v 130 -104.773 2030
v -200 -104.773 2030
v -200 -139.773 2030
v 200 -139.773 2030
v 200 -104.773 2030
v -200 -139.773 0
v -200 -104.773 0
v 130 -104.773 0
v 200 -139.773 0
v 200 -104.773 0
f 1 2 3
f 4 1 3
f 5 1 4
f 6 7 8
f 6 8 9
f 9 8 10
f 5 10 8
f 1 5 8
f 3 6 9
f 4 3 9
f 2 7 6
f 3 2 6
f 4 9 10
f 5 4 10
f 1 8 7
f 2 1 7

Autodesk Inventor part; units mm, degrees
ref_plane "YZ Plane" through (0, 0, 0) normal (1, 0, 0) x (0, 1, 0)
ref_plane "XZ Plane" through (0, 0, 0) normal (0, 1, 0) x (-1, 0, 0)
ref_plane "XY Plane" through (0, 0, 0) normal (0, 0, 1) x (1, 0, 0)
ref_plane "Work Plane1" through (0, 0, 0) normal (0, 0, 1) x (1, 0, 0)
sketch "Sketch1" plane through (0, 0, 0) normal (0, 0, 1) x (1, 0, 0)
  line L0 (-270, -89.7729) -> (-720, -193.6636) projected
  line L1 (-720, -193.6636) -> (-708.7524, -242.3821) projected
  line L2 (-708.7524, -242.3821) -> (-264.3032, -139.7729) projected
  line L3 (-200, -139.7729) -> (-264.3032, -139.7729) projected
  line L4 (-200, -91.2956) -> (-200, -139.7729) projected
  line L5 (130, 139.7729) -> (-200, -91.2956) projected
  line L6 (130, -104.7729) -> (130, 139.7729) projected
  line L7 (200, -104.7729) -> (130, -104.7729) projected
  line L8 (200, 275.2271) -> (200, -104.7729) projected
  line L9 (130, 275.2271) -> (200, 275.2271) projected
  line L10 (130, 225.2271) -> (130, 275.2271) projected
  line L11 (-200, -5.8414) -> (130, 225.2271) projected
  line L12 (-200, 310.2271) -> (-200, -5.8414) projected
  line L13 (-270, 310.2271) -> (-200, 310.2271) projected
  line L14 (-270, -89.7729) -> (-270, 310.2271) projected
  arc A0 (-230, -34.7729) -> (-240, -24.7729) centre (-240, -34.7729) ccw projected
  line L15 (-230, -34.7729) -> (-230, -74.7729) projected
  arc A1 (-240, -84.7729) -> (-230, -74.7729) centre (-240, -74.7729) ccw projected
  line L16 (-240, -84.7729) -> (-250, -84.7729) projected
  arc A2 (-260, -74.7729) -> (-250, -84.7729) centre (-250, -74.7729) ccw projected
  line L17 (-260, -74.7729) -> (-260, -34.7729) projected
  arc A3 (-250, -24.7729) -> (-260, -34.7729) centre (-250, -34.7729) ccw projected
  line L18 (-250, -24.7729) -> (-240, -24.7729) projected
  arc A4 (-230, 225.2271) -> (-240, 235.2271) centre (-240, 225.2271) ccw projected
  line L19 (-230, 225.2271) -> (-230, 185.2271) projected
  arc A5 (-240, 175.2271) -> (-230, 185.2271) centre (-240, 185.2271) ccw projected
  line L20 (-240, 175.2271) -> (-250, 175.2271) projected
  arc A6 (-260, 185.2271) -> (-250, 175.2271) centre (-250, 185.2271) ccw projected
  line L21 (-260, 185.2271) -> (-260, 225.2271) projected
  arc A7 (-250, 235.2271) -> (-260, 225.2271) centre (-250, 225.2271) ccw projected
  line L22 (-250, 235.2271) -> (-240, 235.2271) projected
  arc A8 (-230, 160.2271) -> (-240, 170.2271) centre (-240, 160.2271) ccw projected
  line L23 (-230, 160.2271) -> (-230, 120.2271) projected
  arc A9 (-240, 110.2271) -> (-230, 120.2271) centre (-240, 120.2271) ccw projected
  line L24 (-240, 110.2271) -> (-250, 110.2271) projected
  arc A10 (-260, 120.2271) -> (-250, 110.2271) centre (-250, 120.2271) ccw projected
  line L25 (-260, 120.2271) -> (-260, 160.2271) projected
  arc A11 (-250, 170.2271) -> (-260, 160.2271) centre (-250, 160.2271) ccw projected
  line L26 (-250, 170.2271) -> (-240, 170.2271) projected
  arc A12 (-230, 30.2271) -> (-240, 40.2271) centre (-240, 30.2271) ccw projected
  line L27 (-230, 30.2271) -> (-230, -9.7729) projected
  arc A13 (-240, -19.7729) -> (-230, -9.7729) centre (-240, -9.7729) ccw projected
  line L28 (-240, -19.7729) -> (-250, -19.7729) projected
  arc A14 (-260, -9.7729) -> (-250, -19.7729) centre (-250, -9.7729) ccw projected
  line L29 (-260, -9.7729) -> (-260, 30.2271) projected
  arc A15 (-250, 40.2271) -> (-260, 30.2271) centre (-250, 30.2271) ccw projected
  line L30 (-250, 40.2271) -> (-240, 40.2271) projected
  arc A16 (-230, 290.2271) -> (-240, 300.2271) centre (-240, 290.2271) ccw projected
  line L31 (-230, 290.2271) -> (-230, 250.2271) projected
  arc A17 (-240, 240.2271) -> (-230, 250.2271) centre (-240, 250.2271) ccw projected
  line L32 (-240, 240.2271) -> (-250, 240.2271) projected
  arc A18 (-260, 250.2271) -> (-250, 240.2271) centre (-250, 250.2271) ccw projected
  line L33 (-260, 250.2271) -> (-260, 290.2271) projected
  arc A19 (-250, 300.2271) -> (-260, 290.2271) centre (-250, 290.2271) ccw projected
  line L34 (-250, 300.2271) -> (-240, 300.2271) projected
  arc A20 (-230, 95.2271) -> (-240, 105.2271) centre (-240, 95.2271) ccw projected
  line L35 (-230, 95.2271) -> (-230, 55.2271) projected
  arc A21 (-240, 45.2271) -> (-230, 55.2271) centre (-240, 55.2271) ccw projected
  line L36 (-240, 45.2271) -> (-250, 45.2271) projected
  arc A22 (-260, 55.2271) -> (-250, 45.2271) centre (-250, 55.2271) ccw projected
  line L37 (-260, 55.2271) -> (-260, 95.2271) projected
  arc A23 (-250, 105.2271) -> (-260, 95.2271) centre (-250, 95.2271) ccw projected
  line L38 (-250, 105.2271) -> (-240, 105.2271) projected
  line L39 (-200, -139.7729) -> (-200, -91.2956) projected
  line L40 (-200, -139.7729) -> (200, -139.7729) projected
  line L41 (200, -139.7729) -> (200, -104.7729) projected
  line L42 (130, -104.7729) -> (200, -104.7729) projected
  line L43 (130, 139.7729) -> (130, -104.7729) projected
  line L44 (-200, -91.2956) -> (130, 139.7729) projected
  line L45 (200, 275.2271) -> (200, 310.2271) projected
  line L46 (200, 310.2271) -> (-200, 310.2271) projected
  line L47 (-200, -5.8414) -> (-200, 310.2271) projected
  line L48 (130, 225.2271) -> (-200, -5.8414) projected
  line L49 (130, 275.2271) -> (130, 225.2271) projected
  line L50 (200, 275.2271) -> (130, 275.2271) projected
  line L51 (200, -104.7729) -> (-200, -104.7729)
  line L52 (-200, -104.7729) -> (-200, -139.7729)
  line L53 (-200, -139.7729) -> (200, -139.7729)
  line L54 (200, -139.7729) -> (200, -104.7729)
  point P0 (0, 0)
  point P1 (-200, -104.7729)
extrude "Extrusion1" add sketch "Sketch1" along normal blind 2030 contours L4 L51 L7 L41 L40
properties part number "base-back"
